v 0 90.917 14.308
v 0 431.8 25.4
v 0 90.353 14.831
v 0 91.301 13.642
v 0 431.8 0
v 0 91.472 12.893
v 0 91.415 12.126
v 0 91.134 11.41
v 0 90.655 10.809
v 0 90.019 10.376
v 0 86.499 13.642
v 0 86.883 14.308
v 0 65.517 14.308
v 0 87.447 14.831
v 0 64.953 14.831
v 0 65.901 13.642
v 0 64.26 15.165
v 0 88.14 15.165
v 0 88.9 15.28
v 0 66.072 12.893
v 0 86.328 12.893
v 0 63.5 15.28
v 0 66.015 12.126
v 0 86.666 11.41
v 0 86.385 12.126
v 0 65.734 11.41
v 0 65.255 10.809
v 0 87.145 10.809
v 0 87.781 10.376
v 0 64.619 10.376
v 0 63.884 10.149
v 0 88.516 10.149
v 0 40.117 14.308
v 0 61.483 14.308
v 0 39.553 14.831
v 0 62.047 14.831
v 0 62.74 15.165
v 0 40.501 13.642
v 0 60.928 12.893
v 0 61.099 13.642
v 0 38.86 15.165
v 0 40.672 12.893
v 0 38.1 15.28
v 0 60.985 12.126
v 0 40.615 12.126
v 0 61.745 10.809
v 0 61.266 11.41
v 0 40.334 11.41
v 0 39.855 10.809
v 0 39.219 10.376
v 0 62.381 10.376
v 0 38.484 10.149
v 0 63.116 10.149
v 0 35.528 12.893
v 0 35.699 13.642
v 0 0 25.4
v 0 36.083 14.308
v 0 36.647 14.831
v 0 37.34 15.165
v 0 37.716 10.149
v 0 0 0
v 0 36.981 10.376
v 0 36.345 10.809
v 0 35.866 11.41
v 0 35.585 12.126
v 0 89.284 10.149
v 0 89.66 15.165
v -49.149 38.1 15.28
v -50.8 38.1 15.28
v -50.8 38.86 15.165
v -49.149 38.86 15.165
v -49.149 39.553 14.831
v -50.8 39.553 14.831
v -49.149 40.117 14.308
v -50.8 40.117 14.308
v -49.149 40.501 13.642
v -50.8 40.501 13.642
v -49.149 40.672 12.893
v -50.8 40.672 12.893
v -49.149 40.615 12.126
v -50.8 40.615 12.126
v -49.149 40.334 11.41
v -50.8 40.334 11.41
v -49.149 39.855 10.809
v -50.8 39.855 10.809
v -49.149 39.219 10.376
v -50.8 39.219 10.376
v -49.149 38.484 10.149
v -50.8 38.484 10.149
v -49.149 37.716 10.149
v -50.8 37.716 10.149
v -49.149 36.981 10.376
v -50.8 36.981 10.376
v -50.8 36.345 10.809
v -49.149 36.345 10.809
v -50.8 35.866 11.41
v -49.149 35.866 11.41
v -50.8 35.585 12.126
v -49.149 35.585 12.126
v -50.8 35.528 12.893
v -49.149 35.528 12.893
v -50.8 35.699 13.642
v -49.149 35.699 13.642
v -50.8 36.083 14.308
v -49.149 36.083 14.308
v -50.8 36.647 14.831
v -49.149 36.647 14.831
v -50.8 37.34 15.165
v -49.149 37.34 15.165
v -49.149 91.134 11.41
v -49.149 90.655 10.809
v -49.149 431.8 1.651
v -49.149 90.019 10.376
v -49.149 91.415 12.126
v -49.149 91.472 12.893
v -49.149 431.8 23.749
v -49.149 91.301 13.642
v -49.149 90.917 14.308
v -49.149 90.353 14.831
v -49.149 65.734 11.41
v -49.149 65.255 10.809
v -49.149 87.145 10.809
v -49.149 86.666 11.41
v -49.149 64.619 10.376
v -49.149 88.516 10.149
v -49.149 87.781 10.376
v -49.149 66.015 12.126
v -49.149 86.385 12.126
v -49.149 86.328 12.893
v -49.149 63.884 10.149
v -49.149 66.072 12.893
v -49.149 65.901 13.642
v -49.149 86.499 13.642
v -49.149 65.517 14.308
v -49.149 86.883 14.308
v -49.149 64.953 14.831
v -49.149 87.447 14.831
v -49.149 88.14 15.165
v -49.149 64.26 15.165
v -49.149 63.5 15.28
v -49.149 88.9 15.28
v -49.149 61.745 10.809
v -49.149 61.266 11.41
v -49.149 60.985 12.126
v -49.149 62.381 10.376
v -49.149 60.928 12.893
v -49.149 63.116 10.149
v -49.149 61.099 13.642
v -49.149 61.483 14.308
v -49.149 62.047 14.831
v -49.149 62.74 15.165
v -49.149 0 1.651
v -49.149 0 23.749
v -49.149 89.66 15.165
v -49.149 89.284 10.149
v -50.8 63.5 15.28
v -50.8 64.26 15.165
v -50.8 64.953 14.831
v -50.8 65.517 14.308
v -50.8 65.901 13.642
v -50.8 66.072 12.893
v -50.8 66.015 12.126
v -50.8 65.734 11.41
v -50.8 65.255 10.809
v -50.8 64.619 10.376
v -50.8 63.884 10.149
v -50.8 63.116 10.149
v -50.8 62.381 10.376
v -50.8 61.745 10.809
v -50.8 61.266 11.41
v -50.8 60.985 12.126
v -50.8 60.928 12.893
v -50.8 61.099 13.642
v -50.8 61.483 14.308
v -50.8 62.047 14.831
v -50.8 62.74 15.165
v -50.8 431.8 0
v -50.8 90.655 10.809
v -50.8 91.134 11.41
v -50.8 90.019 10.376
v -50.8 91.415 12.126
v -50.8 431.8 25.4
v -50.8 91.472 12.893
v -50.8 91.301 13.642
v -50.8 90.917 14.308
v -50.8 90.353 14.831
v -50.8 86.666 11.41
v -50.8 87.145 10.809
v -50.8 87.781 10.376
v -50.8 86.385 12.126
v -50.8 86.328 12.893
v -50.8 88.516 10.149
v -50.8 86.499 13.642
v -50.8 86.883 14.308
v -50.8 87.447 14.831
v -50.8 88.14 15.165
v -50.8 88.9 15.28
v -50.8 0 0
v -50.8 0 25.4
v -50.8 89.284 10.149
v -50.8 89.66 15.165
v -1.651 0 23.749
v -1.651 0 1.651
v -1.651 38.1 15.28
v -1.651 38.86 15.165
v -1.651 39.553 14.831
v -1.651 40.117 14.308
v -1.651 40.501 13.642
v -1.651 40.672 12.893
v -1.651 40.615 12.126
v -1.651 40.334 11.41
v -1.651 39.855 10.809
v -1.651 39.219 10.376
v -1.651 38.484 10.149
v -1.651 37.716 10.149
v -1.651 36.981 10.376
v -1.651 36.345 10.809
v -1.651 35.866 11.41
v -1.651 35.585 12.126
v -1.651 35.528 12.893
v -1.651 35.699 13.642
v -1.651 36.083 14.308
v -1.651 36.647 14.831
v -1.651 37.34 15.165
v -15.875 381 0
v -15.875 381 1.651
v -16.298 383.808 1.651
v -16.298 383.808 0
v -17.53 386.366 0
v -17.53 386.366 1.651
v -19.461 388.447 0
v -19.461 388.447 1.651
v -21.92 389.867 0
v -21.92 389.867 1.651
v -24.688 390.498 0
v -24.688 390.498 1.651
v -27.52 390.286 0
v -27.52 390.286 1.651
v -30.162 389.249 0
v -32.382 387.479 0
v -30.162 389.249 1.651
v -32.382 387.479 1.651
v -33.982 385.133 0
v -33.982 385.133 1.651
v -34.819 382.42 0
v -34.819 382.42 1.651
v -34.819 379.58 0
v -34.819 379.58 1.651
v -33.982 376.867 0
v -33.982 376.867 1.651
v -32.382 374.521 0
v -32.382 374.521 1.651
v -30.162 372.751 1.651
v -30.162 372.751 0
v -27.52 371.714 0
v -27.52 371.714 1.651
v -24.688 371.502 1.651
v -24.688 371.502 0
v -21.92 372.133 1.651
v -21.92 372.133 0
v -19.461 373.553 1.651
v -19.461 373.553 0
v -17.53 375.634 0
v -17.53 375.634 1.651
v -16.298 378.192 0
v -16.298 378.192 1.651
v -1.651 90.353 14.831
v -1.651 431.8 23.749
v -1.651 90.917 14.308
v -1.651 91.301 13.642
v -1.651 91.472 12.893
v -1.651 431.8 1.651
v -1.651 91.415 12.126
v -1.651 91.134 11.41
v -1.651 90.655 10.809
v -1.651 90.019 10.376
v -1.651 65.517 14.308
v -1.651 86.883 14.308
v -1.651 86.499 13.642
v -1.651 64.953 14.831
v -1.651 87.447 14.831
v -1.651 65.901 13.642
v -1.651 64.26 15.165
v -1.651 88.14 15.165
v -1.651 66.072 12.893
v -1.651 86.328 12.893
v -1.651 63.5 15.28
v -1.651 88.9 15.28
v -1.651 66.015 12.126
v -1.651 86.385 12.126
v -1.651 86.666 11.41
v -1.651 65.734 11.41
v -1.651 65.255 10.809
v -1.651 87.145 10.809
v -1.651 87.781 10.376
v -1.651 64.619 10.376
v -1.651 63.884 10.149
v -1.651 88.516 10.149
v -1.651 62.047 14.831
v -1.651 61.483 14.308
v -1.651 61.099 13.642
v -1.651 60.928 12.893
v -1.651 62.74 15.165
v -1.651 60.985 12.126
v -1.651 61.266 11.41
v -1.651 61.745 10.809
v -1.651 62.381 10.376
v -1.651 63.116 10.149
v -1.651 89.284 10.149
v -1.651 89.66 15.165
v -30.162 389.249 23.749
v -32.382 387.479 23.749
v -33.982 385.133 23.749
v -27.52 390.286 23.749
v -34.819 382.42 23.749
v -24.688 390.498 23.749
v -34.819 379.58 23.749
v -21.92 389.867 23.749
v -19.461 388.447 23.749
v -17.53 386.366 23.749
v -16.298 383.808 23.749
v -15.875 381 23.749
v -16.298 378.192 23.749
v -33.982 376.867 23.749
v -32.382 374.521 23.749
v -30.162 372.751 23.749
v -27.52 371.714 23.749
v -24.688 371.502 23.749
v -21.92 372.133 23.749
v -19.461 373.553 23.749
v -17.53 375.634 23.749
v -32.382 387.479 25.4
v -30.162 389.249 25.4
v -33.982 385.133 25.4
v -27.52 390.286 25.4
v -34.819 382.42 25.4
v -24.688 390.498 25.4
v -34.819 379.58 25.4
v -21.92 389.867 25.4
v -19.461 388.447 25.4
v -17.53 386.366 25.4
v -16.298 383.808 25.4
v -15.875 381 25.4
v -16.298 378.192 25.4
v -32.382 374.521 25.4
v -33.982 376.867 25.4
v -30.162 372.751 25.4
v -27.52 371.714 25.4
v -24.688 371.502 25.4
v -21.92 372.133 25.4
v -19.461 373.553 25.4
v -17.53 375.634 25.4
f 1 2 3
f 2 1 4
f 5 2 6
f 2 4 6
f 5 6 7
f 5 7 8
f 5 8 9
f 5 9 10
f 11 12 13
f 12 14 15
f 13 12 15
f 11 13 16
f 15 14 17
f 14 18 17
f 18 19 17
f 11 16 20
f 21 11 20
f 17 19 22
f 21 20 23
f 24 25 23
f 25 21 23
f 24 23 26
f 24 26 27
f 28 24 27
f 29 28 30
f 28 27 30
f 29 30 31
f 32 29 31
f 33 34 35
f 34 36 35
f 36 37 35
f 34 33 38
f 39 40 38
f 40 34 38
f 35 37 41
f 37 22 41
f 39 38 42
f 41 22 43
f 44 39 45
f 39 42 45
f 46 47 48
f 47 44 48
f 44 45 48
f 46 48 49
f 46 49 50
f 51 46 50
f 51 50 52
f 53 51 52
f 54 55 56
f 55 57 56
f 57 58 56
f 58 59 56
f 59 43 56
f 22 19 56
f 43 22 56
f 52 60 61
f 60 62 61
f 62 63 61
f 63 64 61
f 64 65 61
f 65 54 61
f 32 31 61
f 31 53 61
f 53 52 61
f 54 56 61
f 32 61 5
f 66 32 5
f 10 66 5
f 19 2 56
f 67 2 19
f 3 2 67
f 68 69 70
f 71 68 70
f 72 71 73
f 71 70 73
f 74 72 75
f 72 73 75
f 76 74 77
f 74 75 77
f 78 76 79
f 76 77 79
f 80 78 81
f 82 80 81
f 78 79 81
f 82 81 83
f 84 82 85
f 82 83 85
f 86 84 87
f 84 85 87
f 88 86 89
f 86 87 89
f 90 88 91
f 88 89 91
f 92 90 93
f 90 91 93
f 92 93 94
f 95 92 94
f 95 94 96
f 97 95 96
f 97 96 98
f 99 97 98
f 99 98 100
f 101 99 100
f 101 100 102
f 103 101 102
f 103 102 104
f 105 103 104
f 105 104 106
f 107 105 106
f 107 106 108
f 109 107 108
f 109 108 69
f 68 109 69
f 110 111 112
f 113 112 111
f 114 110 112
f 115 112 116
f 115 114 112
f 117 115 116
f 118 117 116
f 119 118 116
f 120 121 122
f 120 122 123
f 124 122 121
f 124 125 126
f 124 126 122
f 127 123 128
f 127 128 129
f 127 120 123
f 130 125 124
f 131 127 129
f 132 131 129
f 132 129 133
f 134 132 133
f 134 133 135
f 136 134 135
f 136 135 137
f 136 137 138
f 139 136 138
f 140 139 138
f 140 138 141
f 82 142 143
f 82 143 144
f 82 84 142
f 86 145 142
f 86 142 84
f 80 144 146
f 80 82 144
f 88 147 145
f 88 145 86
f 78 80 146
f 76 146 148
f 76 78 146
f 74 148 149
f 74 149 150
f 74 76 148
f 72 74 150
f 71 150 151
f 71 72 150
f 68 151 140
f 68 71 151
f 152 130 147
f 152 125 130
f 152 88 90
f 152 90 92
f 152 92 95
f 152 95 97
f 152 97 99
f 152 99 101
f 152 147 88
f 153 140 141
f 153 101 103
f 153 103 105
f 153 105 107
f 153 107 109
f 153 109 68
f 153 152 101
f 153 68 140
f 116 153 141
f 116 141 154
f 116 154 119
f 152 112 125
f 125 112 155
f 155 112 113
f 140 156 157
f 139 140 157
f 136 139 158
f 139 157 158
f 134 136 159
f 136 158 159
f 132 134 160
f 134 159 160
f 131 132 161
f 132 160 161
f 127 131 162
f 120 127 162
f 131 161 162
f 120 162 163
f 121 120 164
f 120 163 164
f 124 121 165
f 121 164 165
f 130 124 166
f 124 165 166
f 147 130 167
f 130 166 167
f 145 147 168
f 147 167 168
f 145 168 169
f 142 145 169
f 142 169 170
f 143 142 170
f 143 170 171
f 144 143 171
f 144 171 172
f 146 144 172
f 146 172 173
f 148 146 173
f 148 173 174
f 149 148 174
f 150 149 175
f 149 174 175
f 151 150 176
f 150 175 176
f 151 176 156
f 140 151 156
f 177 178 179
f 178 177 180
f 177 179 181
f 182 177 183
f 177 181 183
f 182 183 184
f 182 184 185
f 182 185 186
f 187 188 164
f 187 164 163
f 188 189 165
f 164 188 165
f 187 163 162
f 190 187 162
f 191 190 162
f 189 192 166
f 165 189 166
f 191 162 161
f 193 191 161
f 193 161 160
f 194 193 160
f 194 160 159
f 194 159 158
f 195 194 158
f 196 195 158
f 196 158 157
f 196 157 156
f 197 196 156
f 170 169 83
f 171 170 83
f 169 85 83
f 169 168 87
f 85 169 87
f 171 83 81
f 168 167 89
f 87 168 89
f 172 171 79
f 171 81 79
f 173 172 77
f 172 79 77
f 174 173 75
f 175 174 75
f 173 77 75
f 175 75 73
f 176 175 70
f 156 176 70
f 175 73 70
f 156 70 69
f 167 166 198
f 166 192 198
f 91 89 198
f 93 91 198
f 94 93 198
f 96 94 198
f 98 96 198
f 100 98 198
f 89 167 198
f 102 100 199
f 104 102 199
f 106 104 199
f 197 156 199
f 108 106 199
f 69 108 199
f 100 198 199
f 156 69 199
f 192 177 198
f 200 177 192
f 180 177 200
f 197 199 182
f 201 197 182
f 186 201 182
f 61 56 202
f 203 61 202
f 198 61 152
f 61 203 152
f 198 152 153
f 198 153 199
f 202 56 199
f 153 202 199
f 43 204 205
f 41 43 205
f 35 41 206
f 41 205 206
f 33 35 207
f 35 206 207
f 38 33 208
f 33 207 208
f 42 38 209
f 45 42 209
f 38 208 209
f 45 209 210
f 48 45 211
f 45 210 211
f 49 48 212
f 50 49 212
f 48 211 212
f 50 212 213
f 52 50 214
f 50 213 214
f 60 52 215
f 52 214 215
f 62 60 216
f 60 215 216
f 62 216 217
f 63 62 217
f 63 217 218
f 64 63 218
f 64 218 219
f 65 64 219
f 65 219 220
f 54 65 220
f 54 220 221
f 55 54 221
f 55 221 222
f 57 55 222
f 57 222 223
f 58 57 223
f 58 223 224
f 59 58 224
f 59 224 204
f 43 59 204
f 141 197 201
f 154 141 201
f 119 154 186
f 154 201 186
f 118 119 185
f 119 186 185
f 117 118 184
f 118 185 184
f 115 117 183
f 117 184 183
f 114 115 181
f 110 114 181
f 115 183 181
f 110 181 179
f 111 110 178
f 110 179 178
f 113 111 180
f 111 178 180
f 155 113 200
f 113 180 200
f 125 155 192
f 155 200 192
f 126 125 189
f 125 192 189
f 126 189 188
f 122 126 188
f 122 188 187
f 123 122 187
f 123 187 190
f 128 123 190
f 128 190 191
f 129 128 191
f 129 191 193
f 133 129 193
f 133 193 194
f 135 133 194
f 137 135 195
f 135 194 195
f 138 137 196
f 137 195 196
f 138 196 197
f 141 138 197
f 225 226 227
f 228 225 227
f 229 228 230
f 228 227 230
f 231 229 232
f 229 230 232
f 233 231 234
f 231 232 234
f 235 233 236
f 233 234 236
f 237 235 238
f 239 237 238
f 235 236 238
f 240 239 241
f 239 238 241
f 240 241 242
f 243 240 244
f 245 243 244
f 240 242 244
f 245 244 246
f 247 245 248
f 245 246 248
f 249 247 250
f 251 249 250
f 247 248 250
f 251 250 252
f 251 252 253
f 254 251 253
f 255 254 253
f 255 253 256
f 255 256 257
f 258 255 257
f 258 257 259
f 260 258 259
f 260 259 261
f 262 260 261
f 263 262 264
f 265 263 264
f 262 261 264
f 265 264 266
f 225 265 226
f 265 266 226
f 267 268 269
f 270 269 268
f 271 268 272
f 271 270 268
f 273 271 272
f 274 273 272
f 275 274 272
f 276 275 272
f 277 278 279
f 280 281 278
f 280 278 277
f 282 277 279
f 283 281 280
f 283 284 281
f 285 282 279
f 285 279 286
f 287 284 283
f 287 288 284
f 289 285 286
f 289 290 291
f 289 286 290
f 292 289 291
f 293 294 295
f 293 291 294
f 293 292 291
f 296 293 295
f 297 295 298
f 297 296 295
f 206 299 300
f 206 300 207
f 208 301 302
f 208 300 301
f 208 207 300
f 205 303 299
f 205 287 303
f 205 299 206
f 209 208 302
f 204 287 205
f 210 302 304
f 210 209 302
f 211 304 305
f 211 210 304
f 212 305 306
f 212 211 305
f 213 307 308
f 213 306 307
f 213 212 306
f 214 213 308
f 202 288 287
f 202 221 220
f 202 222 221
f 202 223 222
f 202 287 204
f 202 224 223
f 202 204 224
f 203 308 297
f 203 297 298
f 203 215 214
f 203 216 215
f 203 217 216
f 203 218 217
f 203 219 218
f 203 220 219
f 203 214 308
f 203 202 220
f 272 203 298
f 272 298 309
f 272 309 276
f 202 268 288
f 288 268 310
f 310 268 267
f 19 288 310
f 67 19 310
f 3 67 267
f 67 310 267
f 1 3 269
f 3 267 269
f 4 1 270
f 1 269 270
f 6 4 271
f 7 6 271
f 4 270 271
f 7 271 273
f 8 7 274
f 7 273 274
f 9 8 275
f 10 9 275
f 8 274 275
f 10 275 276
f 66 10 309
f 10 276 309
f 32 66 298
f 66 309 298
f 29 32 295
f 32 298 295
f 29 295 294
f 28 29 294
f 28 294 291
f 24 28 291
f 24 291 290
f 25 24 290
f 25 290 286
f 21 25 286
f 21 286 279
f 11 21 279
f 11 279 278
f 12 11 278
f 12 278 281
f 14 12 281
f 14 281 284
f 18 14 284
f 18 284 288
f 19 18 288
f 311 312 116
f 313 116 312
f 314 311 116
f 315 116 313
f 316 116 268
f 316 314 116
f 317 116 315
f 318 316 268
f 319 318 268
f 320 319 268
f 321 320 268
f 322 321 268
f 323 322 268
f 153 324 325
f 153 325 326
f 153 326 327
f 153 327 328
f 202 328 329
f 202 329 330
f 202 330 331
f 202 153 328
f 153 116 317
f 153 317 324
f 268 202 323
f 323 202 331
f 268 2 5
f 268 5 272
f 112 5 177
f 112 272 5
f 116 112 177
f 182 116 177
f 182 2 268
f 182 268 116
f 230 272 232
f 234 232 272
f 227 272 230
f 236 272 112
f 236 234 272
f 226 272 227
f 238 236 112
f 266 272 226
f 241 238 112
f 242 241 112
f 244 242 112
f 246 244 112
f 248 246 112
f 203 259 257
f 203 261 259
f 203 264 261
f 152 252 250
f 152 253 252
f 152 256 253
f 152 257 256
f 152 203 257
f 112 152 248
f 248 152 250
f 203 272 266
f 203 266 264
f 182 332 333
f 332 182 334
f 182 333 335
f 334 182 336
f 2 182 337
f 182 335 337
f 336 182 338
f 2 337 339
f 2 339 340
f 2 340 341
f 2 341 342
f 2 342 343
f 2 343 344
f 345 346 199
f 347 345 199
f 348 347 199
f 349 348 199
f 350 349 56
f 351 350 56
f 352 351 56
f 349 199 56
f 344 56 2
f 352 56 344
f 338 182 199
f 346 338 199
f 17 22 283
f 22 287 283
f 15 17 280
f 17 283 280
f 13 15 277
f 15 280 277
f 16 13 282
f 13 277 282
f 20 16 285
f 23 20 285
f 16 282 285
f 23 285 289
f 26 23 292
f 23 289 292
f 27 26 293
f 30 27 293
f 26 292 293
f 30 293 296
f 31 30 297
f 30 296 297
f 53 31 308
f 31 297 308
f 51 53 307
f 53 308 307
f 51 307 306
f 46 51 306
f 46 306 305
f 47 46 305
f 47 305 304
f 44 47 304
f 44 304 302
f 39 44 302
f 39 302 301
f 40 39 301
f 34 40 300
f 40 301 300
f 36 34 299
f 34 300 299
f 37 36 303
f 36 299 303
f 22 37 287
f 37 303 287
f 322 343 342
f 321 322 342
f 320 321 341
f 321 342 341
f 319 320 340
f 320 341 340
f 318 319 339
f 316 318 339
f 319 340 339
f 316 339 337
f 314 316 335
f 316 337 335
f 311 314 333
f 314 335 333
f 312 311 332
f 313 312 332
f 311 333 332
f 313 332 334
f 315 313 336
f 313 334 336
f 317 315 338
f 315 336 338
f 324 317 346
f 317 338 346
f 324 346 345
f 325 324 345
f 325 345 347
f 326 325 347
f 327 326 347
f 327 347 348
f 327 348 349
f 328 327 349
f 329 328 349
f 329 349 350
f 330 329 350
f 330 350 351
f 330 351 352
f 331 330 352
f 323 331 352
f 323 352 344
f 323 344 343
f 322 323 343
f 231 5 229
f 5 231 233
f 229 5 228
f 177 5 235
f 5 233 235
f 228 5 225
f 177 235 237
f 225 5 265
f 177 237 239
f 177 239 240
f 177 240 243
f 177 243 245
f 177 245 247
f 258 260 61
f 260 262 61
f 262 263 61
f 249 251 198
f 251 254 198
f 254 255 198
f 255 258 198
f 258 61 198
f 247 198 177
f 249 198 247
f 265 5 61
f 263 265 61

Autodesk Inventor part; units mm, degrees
ref_plane "YZ Plane" through (0, 0, 0) normal (1, 0, 0) x (0, 1, 0)
ref_plane "XZ Plane" through (0, 0, 0) normal (0, 1, 0) x (-1, 0, 0)
ref_plane "XY Plane" through (0, 0, 0) normal (0, 0, 1) x (1, 0, 0)
sketch "Sketch1" plane through (0, 0, 0) normal (0, 1, 0) x (-1, 0, 0)
  line L0 (0, 0) -> (50.8, 0)
  line L1 (50.8, 0) -> (50.8, 25.4)
  line L2 (50.8, 25.4) -> (0, 25.4)
  line L3 (0, 25.4) -> (0, 0)
  line L4 (49.149, 23.749) -> (1.651, 23.749)
  line L5 (1.651, 23.749) -> (1.651, 1.651)
  line L6 (1.651, 1.651) -> (49.149, 1.651)
  line L7 (49.149, 1.651) -> (49.149, 23.749)
  dimension "d0" = 50.8
  dimension "d1" = 25.4
  dimension "d2" = 1.651
  dimension "d3" = 1.651
  dimension "d4" = 1.651
  dimension "d5" = 1.651
extrude "Extrusion1" add sketch "Sketch1" along normal blind 431.8
sketch "Sketch2" plane through (-50.8, 0, 0) normal (-1, 0, 0) x (0, 0, 1)
  circle A0 centre (12.7, 38.1) radius 2.5797
  circle A1 centre (12.7, 63.5) radius 2.5797
  circle A2 centre (12.7, 88.9) radius 2.5797
  line L0 (0, 0) -> (0, 431.8) projected
  line L1 (0, 0) -> (25.4, 0) projected
  dimension "d8" = 5.1594
  dimension "d9" = 12.7
  dimension "d10" = 12.7
  dimension "d11" = 12.7
  dimension "d12" = 5.1594
  dimension "d13" = 5.1594
  dimension "d14" = 25.4
  dimension "d15" = 50.8
  dimension "d16" = 38.1
extrude "Extrusion2" cut sketch "Sketch2" against normal blind 609.6
sketch "Sketch3" plane through (-50.8, 0, 25.4) normal (0, 0, 1) x (1, 0, 0)
  circle A0 centre (25.4, 381) radius 9.525
  line L0 (0, 431.8) -> (50.8, 431.8) projected
  line L1 (50.8, 0) -> (50.8, 431.8) projected
  dimension "d19" = 19.05
  dimension "d20" = 50.8
  dimension "d26" = 25.4
extrude "Extrusion3" cut sketch "Sketch3" against normal blind 25.4
equation "\"d3\" = d2"
equation "\"d4\" = d2"
equation "\"d5\" = d2"
equation "\"d10\" = d9"
equation "\"d11\" = d9"
equation "\"d12\" = d8"
equation "\"d13\" = d8"
properties part number "mounting part 2"
